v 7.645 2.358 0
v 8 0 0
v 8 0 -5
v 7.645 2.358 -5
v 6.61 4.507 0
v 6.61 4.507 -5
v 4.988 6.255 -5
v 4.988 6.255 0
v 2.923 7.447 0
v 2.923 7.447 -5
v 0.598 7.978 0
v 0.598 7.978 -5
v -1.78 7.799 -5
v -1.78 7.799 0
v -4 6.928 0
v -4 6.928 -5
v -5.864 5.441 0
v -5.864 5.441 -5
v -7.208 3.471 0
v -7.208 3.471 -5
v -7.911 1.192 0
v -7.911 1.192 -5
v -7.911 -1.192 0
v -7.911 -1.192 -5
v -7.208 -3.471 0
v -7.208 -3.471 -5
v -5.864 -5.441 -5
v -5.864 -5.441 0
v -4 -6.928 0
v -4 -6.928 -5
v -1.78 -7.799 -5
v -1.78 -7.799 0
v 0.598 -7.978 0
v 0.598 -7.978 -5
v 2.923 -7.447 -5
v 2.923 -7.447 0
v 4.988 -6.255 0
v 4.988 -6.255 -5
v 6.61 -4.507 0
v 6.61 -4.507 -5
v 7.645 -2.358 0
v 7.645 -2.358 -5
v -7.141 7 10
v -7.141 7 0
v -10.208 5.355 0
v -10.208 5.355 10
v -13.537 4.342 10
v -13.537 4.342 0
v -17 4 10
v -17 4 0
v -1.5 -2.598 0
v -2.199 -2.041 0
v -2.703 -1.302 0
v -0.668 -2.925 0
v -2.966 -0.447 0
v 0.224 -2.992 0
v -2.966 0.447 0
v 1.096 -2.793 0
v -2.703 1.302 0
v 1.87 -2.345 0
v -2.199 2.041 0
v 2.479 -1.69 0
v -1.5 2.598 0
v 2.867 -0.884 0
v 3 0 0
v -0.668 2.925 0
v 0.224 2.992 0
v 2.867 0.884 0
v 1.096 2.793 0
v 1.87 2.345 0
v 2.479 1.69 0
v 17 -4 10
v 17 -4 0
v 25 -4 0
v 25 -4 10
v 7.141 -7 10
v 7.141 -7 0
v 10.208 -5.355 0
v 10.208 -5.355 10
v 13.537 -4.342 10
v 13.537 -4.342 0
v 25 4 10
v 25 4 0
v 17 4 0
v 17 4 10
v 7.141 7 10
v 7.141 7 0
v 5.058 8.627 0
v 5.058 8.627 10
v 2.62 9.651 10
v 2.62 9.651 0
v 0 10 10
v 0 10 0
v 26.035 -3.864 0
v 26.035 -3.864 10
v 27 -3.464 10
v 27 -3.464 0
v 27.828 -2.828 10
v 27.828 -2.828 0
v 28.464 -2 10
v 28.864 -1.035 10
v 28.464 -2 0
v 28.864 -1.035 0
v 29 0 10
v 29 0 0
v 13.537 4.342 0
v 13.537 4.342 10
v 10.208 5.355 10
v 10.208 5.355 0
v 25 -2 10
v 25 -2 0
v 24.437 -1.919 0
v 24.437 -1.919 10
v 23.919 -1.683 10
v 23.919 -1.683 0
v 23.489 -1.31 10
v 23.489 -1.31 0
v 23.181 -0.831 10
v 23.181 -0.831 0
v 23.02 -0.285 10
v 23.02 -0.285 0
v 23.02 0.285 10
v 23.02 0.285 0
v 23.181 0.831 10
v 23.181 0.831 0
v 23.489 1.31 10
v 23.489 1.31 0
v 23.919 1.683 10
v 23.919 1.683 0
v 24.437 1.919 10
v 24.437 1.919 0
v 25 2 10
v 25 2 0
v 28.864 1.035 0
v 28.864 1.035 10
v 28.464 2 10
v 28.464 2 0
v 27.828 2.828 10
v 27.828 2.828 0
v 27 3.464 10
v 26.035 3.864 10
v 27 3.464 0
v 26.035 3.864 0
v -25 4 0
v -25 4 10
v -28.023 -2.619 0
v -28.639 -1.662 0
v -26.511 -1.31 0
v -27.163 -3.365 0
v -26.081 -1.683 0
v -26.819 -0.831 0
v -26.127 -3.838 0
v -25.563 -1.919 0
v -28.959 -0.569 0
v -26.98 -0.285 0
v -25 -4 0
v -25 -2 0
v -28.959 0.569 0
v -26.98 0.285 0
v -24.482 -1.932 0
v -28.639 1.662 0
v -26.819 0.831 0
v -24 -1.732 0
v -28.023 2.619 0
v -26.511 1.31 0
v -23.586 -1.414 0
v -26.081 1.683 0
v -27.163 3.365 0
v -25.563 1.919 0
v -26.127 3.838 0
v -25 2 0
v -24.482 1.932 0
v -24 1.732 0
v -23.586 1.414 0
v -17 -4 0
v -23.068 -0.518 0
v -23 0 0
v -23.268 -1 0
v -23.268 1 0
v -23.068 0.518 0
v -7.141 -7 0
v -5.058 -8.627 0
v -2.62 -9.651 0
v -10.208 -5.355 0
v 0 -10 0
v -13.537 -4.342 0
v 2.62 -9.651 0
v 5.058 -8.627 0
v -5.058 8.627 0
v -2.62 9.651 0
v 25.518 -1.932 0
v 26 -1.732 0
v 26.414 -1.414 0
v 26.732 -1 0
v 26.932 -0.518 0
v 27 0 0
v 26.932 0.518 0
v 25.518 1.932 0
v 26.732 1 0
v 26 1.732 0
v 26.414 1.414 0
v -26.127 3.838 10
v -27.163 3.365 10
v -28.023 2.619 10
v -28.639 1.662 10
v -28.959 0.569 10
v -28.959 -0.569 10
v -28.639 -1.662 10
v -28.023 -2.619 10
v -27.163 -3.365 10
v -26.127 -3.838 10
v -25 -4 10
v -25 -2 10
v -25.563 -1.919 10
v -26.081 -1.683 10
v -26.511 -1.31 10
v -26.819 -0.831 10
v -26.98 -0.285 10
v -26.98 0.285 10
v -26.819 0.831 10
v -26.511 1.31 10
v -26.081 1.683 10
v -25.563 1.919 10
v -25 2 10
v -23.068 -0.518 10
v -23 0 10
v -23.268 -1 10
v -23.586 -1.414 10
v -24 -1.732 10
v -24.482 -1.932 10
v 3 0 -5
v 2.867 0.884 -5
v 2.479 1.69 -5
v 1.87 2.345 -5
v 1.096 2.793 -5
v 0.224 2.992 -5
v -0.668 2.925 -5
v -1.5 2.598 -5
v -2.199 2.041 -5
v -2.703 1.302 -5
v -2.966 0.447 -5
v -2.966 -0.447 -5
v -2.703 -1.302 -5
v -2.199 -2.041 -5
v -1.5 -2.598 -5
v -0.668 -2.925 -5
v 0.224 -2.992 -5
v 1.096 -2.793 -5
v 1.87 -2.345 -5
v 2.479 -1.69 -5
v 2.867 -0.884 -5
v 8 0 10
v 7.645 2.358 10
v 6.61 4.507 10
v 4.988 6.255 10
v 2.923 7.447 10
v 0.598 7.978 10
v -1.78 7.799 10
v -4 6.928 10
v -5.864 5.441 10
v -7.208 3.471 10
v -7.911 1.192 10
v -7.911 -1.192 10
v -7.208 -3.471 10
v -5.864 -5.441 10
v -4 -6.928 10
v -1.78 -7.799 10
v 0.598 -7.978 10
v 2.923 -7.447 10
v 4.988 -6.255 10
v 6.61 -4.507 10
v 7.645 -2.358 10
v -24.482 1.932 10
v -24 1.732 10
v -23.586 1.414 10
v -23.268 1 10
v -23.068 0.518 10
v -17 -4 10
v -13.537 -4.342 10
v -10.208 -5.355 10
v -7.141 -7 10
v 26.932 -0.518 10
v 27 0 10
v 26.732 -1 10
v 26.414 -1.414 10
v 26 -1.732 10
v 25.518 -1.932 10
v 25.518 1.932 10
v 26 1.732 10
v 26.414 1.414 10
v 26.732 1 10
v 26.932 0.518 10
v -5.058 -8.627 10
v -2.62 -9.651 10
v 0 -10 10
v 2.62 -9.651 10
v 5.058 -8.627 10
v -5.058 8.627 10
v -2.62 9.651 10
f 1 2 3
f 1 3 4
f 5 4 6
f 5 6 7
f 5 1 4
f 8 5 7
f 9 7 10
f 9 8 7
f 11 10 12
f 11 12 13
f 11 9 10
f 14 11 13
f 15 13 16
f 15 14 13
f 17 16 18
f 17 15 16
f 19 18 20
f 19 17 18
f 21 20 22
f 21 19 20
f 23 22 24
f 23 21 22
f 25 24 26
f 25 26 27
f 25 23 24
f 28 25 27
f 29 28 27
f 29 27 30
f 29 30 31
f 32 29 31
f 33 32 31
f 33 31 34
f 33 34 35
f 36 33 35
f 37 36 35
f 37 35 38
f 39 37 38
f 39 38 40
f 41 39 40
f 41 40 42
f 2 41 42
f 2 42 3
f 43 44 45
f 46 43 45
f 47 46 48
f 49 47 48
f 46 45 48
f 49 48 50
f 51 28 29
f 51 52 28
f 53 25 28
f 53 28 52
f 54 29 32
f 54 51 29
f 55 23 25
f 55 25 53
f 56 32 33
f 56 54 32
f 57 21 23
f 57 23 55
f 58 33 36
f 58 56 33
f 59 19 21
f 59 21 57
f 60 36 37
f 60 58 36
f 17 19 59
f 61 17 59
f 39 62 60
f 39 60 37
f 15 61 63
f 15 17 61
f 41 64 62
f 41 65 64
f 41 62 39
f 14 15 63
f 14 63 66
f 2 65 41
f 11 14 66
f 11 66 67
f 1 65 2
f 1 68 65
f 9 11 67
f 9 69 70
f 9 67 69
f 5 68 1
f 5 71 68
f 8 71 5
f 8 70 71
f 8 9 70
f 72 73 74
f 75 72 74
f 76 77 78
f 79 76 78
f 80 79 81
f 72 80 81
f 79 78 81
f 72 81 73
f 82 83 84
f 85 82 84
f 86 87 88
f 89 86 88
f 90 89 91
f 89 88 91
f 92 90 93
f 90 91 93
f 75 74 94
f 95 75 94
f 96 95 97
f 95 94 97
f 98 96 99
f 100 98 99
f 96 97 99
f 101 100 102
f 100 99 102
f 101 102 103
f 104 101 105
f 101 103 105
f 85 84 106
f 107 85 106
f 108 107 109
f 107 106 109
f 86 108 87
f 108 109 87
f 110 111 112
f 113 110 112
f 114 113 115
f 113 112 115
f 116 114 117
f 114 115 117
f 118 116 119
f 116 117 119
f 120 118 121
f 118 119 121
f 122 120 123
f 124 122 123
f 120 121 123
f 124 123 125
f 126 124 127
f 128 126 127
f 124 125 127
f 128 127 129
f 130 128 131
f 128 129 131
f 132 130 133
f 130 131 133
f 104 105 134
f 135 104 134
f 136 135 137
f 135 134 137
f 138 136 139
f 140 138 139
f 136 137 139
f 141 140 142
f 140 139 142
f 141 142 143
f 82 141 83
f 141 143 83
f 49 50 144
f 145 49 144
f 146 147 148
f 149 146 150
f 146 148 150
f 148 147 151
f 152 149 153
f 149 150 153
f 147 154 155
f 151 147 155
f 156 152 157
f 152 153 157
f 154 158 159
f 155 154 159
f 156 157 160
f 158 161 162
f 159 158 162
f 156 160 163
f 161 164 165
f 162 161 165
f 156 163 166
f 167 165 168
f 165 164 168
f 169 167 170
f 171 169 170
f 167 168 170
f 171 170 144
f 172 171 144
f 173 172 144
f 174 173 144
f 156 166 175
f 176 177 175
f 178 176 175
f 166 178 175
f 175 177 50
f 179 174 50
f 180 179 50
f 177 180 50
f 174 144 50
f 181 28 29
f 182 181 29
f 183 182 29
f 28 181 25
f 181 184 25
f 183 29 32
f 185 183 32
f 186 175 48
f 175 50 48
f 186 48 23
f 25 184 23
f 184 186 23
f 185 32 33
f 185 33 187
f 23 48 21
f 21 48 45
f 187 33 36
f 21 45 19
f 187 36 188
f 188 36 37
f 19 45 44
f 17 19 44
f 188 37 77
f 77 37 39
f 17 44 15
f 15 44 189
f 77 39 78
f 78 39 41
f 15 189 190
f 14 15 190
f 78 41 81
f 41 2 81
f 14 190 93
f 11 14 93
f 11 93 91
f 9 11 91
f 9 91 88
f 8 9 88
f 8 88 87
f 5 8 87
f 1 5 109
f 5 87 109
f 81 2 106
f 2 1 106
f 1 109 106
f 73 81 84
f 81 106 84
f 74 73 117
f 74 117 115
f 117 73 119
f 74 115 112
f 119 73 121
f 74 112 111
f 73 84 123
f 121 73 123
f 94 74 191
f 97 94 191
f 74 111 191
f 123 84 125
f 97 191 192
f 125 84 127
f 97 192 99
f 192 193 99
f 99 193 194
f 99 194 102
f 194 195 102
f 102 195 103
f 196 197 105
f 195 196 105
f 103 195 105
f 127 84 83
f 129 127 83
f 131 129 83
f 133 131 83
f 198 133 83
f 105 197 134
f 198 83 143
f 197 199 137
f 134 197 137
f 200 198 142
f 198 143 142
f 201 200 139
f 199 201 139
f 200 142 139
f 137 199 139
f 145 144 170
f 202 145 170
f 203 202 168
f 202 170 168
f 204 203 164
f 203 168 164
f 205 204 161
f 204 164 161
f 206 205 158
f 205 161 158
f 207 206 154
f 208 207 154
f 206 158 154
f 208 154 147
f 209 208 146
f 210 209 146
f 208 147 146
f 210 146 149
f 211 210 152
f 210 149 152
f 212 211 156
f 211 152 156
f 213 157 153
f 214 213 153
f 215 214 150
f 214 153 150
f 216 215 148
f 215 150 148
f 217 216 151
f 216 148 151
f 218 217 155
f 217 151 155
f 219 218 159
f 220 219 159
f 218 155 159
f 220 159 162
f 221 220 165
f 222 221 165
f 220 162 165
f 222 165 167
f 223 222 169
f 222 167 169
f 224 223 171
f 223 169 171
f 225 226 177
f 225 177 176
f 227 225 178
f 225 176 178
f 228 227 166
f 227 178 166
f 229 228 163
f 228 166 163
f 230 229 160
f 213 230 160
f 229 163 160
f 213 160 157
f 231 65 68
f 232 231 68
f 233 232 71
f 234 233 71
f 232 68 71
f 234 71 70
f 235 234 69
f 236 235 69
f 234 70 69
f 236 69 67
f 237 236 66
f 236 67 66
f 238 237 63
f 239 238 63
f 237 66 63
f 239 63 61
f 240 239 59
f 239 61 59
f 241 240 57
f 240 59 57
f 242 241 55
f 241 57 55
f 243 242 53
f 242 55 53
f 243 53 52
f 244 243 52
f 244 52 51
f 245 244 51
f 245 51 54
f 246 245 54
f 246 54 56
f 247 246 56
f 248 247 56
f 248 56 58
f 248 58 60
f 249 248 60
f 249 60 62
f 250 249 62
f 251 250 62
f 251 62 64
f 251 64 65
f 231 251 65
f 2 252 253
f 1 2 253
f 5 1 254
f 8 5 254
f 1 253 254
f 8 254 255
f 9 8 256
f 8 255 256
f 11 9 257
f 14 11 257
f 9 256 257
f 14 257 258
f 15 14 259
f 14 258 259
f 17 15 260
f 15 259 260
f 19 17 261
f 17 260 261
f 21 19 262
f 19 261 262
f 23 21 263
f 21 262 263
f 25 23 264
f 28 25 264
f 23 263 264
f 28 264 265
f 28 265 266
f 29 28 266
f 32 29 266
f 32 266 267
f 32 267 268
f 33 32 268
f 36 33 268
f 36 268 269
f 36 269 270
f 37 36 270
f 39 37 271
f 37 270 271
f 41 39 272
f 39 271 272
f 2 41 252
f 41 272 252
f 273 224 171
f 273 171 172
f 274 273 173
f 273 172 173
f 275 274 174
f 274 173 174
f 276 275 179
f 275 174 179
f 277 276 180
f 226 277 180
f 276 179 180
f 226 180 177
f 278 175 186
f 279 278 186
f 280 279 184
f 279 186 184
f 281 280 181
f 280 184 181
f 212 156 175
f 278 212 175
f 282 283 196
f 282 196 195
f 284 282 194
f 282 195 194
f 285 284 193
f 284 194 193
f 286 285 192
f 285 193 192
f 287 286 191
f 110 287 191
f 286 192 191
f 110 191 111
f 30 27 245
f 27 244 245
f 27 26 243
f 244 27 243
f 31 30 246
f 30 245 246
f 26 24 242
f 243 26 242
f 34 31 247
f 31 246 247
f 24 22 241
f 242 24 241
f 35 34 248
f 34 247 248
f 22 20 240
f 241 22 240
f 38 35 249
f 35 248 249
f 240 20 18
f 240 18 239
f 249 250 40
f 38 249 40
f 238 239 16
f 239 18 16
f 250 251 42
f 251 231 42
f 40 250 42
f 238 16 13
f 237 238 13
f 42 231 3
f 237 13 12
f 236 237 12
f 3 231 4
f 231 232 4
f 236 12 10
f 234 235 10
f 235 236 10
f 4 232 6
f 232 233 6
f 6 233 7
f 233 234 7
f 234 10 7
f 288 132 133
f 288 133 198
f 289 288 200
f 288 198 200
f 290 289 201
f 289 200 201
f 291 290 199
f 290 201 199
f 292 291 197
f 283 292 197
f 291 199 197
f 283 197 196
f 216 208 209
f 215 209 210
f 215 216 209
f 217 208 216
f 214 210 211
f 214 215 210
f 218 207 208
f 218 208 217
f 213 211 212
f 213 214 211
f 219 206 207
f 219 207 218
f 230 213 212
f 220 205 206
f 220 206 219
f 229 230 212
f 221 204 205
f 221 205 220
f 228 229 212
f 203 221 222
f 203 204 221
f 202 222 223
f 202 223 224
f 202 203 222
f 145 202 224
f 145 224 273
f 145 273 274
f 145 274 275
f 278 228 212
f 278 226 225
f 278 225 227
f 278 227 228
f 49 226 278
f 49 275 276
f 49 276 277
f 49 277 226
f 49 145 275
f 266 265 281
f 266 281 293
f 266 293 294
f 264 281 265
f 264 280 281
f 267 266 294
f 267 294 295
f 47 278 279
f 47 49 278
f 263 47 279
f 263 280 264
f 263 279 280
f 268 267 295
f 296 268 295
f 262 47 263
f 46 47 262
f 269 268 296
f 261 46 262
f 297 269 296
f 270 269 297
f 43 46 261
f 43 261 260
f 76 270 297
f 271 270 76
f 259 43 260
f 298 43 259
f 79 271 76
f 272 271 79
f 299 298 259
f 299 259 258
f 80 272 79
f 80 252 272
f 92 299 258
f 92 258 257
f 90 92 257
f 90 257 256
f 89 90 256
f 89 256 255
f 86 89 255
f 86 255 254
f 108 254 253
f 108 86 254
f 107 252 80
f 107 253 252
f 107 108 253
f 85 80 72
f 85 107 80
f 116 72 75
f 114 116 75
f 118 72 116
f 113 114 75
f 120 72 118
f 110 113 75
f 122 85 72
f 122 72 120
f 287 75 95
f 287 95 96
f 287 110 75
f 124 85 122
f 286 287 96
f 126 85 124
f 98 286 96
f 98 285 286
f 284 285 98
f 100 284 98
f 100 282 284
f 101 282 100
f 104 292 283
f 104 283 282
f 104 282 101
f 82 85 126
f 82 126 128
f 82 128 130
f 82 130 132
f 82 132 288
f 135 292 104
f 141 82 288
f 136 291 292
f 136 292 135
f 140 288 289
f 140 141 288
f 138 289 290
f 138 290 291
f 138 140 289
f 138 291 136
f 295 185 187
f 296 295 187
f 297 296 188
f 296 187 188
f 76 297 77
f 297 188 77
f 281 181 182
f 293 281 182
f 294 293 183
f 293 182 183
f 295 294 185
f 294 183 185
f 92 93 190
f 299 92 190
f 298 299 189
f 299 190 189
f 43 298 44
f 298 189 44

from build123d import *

# Parameters (mm, degrees)
F1_DEPTH = 10
F2_R     = 8
F3_DEPTH = 15
F4_R     = 8
F5_DEPTH = 10
F6_R     = 3
F7_DEPTH = 25


with BuildPart() as f1:
    # F0 (on Top) → F1 (new body)
    with BuildSketch(Plane.XY):
        with BuildLine():
            Line((-25, 2), (-25, 4))
            ThreePointArc((-25, 4), (-29, 0), (-25, -4))
            Line((-25, -4), (-25, -2))
            ThreePointArc((-25, -2), (-27, 0), (-25, 2))
        make_face()
        with BuildLine():
            ThreePointArc((-21, 0), (-22.1715728753, 2.8284271247), (-25, 4))
            Line((-25, 4), (-25, 2))
            ThreePointArc((-25, 2), (-23.5857864376, 1.4142135624), (-23, 0))
            ThreePointArc((-23, 0), (-23.5857864376, -1.4142135624), (-25, -2))
            Line((-25, -2), (-25, -4))
            ThreePointArc((-25, -4), (-22.1715728753, -2.8284271247), (-21, 0))
        make_face()
        with BuildLine():
            ThreePointArc((-7.1414284285, -7), (-10, 0), (-7.1414284285, 7))
            ThreePointArc((-7.1414284285, 7), (-11.8475386118, 4.7666024499), (-17, 4))
            Line((-17, 4), (-25, 4))
            ThreePointArc((-25, 4), (-22.1715728753, 2.8284271247), (-21, 0))
            ThreePointArc((-21, 0), (-22.1715728753, -2.8284271247), (-25, -4))
            Line((-25, -4), (-17, -4))
            ThreePointArc((-17, -4), (-11.8475386118, -4.7666024499), (-7.1414284285, -7))
        make_face()
        with BuildLine():
            Line((-2.6925824036, 7), (-7.1414284285, 7))
            ThreePointArc((-7.1414284285, 7), (-10, 0), (-7.1414284285, -7))
            Line((-7.1414284285, -7), (-2.6925824036, -7))
            ThreePointArc((-2.6925824036, -7), (-7.5, 0), (-2.6925824036, 7))
        make_face()
        with BuildLine():
            ThreePointArc((7.1414284285, -7), (9.2578151927, -3.7805896177), (10, 0))
            ThreePointArc((10, 0), (9.2578151927, 3.7805896177), (7.1414284285, 7))
            Line((7.1414284285, 7), (2.6925824036, 7))
            ThreePointArc((2.6925824036, 7), (6.1824092402, 4.2459175671), (7.5, 0))
            ThreePointArc((7.5, 0), (6.1824092402, -4.2459175671), (2.6925824036, -7))
            Line((2.6925824036, -7), (7.1414284285, -7))
        make_face()
        with BuildLine():
            ThreePointArc((7.1414284285, 7), (9.2578151927, 3.7805896177), (10, 0))
            ThreePointArc((10, 0), (9.2578151927, -3.7805896177), (7.1414284285, -7))
            ThreePointArc((7.1414284285, -7), (11.8475386118, -4.7666024499), (17, -4))
            Line((17, -4), (25, -4))
            ThreePointArc((25, -4), (21, 0), (25, 4))
            Line((25, 4), (17, 4))
            ThreePointArc((17, 4), (11.8475386118, 4.7666024499), (7.1414284285, 7))
        make_face()
        with BuildLine():
            ThreePointArc((-2.6925824036, -7), (-1.3693063938, -7.3739406019), (0, -7.5))
            Line((0, -7.5), (0, -7))
            Line((0, -7), (-2.6925824036, -7))
        make_face()
        with BuildLine():
            ThreePointArc((0, -7.5), (1.3693063938, -7.3739406019), (2.6925824036, -7))
            Line((2.6925824036, -7), (0, -7))
            Line((0, -7), (0, -7.5))
        make_face()
        with BuildLine():
            ThreePointArc((-7.1414284285, -7), (-3.8729833462, -9.2195444573), (0, -10))
            Line((0, -10), (0, -7.5))
            ThreePointArc((0, -7.5), (-1.3693063938, -7.3739406019), (-2.6925824036, -7))
            Line((-2.6925824036, -7), (-7.1414284285, -7))
        make_face()
        with BuildLine():
            ThreePointArc((0, -10), (3.8729833462, -9.2195444573), (7.1414284285, -7))
            Line((7.1414284285, -7), (2.6925824036, -7))
            ThreePointArc((2.6925824036, -7), (1.3693063938, -7.3739406019), (0, -7.5))
            Line((0, -7.5), (0, -10))
        make_face()
        with BuildLine():
            Line((0, 3), (0, 7))
            Line((0, 7), (-2.6925824036, 7))
            ThreePointArc((-2.6925824036, 7), (-7.5, 0), (-2.6925824036, -7))
            Line((-2.6925824036, -7), (0, -7))
            Line((0, -7), (0, -3))
            ThreePointArc((0, -3), (-3, 0), (0, 3))
        make_face()
        with BuildLine():
            ThreePointArc((7.5, 0), (6.1824092402, 4.2459175671), (2.6925824036, 7))
            Line((2.6925824036, 7), (0, 7))
            Line((0, 7), (0, 3))
            ThreePointArc((0, 3), (2.1213203436, 2.1213203436), (3, 0))
            ThreePointArc((3, 0), (2.1213203436, -2.1213203436), (0, -3))
            Line((0, -3), (0, -7))
            Line((0, -7), (2.6925824036, -7))
            ThreePointArc((2.6925824036, -7), (6.1824092402, -4.2459175671), (7.5, 0))
        make_face()
        with BuildLine():
            Line((25, 2), (25, 4))
            ThreePointArc((25, 4), (21, 0), (25, -4))
            Line((25, -4), (25, -2))
            ThreePointArc((25, -2), (23, 0), (25, 2))
        make_face()
        with BuildLine():
            ThreePointArc((29, 0), (27.8284271247, 2.8284271247), (25, 4))
            Line((25, 4), (25, 2))
            ThreePointArc((25, 2), (26.4142135624, 1.4142135624), (27, 0))
            ThreePointArc((27, 0), (26.4142135624, -1.4142135624), (25, -2))
            Line((25, -2), (25, -4))
            ThreePointArc((25, -4), (27.8284271247, -2.8284271247), (29, 0))
        make_face()
        with BuildLine():
            Line((0, 7), (0, 7.5))
            ThreePointArc((0, 7.5), (-1.3693063938, 7.3739406019), (-2.6925824036, 7))
            Line((-2.6925824036, 7), (0, 7))
        make_face()
        with BuildLine():
            Line((0, 7), (2.6925824036, 7))
            ThreePointArc((2.6925824036, 7), (1.3693063938, 7.3739406019), (0, 7.5))
            Line((0, 7.5), (0, 7))
        make_face()
        with BuildLine():
            Line((0, 7.5), (0, 10))
            ThreePointArc((0, 10), (-3.8729833462, 9.2195444573), (-7.1414284285, 7))
            Line((-7.1414284285, 7), (-2.6925824036, 7))
            ThreePointArc((-2.6925824036, 7), (-1.3693063938, 7.3739406019), (0, 7.5))
        make_face()
        with BuildLine():
            Line((2.6925824036, 7), (7.1414284285, 7))
            ThreePointArc((7.1414284285, 7), (3.8729833462, 9.2195444573), (0, 10))
            Line((0, 10), (0, 7.5))
            ThreePointArc((0, 7.5), (1.3693063938, 7.3739406019), (2.6925824036, 7))
        make_face()
    extrude(amount=F1_DEPTH)


with BuildPart() as f3:
    # F2 (on face) → F3 (new body)
    with BuildSketch(Plane.XY.offset(10)):
        Circle(F2_R)
    extrude(amount=-F3_DEPTH)


with BuildPart() as f5_tool:
    # F4 (on face) → F5 (new body)
    with BuildSketch(Plane.XY.offset(10)):
        Circle(F4_R)
    extrude(amount=-F5_DEPTH)


with BuildPart() as f1_1:
    add(f1.part)

    # F5: cut by f5_tool
    add(f5_tool.part, mode=Mode.SUBTRACT)


with BuildPart() as f3_1:
    add(f3.part)

    # F5: cut by f5_tool
    add(f5_tool.part, mode=Mode.SUBTRACT)

    # F6 (on Top) → F7 (cut)
    with BuildSketch(Plane.XY):
        Circle(F6_R)
    extrude(amount=-F7_DEPTH, mode=Mode.SUBTRACT)


solid = Compound([f1_1.part, f3_1.part])
